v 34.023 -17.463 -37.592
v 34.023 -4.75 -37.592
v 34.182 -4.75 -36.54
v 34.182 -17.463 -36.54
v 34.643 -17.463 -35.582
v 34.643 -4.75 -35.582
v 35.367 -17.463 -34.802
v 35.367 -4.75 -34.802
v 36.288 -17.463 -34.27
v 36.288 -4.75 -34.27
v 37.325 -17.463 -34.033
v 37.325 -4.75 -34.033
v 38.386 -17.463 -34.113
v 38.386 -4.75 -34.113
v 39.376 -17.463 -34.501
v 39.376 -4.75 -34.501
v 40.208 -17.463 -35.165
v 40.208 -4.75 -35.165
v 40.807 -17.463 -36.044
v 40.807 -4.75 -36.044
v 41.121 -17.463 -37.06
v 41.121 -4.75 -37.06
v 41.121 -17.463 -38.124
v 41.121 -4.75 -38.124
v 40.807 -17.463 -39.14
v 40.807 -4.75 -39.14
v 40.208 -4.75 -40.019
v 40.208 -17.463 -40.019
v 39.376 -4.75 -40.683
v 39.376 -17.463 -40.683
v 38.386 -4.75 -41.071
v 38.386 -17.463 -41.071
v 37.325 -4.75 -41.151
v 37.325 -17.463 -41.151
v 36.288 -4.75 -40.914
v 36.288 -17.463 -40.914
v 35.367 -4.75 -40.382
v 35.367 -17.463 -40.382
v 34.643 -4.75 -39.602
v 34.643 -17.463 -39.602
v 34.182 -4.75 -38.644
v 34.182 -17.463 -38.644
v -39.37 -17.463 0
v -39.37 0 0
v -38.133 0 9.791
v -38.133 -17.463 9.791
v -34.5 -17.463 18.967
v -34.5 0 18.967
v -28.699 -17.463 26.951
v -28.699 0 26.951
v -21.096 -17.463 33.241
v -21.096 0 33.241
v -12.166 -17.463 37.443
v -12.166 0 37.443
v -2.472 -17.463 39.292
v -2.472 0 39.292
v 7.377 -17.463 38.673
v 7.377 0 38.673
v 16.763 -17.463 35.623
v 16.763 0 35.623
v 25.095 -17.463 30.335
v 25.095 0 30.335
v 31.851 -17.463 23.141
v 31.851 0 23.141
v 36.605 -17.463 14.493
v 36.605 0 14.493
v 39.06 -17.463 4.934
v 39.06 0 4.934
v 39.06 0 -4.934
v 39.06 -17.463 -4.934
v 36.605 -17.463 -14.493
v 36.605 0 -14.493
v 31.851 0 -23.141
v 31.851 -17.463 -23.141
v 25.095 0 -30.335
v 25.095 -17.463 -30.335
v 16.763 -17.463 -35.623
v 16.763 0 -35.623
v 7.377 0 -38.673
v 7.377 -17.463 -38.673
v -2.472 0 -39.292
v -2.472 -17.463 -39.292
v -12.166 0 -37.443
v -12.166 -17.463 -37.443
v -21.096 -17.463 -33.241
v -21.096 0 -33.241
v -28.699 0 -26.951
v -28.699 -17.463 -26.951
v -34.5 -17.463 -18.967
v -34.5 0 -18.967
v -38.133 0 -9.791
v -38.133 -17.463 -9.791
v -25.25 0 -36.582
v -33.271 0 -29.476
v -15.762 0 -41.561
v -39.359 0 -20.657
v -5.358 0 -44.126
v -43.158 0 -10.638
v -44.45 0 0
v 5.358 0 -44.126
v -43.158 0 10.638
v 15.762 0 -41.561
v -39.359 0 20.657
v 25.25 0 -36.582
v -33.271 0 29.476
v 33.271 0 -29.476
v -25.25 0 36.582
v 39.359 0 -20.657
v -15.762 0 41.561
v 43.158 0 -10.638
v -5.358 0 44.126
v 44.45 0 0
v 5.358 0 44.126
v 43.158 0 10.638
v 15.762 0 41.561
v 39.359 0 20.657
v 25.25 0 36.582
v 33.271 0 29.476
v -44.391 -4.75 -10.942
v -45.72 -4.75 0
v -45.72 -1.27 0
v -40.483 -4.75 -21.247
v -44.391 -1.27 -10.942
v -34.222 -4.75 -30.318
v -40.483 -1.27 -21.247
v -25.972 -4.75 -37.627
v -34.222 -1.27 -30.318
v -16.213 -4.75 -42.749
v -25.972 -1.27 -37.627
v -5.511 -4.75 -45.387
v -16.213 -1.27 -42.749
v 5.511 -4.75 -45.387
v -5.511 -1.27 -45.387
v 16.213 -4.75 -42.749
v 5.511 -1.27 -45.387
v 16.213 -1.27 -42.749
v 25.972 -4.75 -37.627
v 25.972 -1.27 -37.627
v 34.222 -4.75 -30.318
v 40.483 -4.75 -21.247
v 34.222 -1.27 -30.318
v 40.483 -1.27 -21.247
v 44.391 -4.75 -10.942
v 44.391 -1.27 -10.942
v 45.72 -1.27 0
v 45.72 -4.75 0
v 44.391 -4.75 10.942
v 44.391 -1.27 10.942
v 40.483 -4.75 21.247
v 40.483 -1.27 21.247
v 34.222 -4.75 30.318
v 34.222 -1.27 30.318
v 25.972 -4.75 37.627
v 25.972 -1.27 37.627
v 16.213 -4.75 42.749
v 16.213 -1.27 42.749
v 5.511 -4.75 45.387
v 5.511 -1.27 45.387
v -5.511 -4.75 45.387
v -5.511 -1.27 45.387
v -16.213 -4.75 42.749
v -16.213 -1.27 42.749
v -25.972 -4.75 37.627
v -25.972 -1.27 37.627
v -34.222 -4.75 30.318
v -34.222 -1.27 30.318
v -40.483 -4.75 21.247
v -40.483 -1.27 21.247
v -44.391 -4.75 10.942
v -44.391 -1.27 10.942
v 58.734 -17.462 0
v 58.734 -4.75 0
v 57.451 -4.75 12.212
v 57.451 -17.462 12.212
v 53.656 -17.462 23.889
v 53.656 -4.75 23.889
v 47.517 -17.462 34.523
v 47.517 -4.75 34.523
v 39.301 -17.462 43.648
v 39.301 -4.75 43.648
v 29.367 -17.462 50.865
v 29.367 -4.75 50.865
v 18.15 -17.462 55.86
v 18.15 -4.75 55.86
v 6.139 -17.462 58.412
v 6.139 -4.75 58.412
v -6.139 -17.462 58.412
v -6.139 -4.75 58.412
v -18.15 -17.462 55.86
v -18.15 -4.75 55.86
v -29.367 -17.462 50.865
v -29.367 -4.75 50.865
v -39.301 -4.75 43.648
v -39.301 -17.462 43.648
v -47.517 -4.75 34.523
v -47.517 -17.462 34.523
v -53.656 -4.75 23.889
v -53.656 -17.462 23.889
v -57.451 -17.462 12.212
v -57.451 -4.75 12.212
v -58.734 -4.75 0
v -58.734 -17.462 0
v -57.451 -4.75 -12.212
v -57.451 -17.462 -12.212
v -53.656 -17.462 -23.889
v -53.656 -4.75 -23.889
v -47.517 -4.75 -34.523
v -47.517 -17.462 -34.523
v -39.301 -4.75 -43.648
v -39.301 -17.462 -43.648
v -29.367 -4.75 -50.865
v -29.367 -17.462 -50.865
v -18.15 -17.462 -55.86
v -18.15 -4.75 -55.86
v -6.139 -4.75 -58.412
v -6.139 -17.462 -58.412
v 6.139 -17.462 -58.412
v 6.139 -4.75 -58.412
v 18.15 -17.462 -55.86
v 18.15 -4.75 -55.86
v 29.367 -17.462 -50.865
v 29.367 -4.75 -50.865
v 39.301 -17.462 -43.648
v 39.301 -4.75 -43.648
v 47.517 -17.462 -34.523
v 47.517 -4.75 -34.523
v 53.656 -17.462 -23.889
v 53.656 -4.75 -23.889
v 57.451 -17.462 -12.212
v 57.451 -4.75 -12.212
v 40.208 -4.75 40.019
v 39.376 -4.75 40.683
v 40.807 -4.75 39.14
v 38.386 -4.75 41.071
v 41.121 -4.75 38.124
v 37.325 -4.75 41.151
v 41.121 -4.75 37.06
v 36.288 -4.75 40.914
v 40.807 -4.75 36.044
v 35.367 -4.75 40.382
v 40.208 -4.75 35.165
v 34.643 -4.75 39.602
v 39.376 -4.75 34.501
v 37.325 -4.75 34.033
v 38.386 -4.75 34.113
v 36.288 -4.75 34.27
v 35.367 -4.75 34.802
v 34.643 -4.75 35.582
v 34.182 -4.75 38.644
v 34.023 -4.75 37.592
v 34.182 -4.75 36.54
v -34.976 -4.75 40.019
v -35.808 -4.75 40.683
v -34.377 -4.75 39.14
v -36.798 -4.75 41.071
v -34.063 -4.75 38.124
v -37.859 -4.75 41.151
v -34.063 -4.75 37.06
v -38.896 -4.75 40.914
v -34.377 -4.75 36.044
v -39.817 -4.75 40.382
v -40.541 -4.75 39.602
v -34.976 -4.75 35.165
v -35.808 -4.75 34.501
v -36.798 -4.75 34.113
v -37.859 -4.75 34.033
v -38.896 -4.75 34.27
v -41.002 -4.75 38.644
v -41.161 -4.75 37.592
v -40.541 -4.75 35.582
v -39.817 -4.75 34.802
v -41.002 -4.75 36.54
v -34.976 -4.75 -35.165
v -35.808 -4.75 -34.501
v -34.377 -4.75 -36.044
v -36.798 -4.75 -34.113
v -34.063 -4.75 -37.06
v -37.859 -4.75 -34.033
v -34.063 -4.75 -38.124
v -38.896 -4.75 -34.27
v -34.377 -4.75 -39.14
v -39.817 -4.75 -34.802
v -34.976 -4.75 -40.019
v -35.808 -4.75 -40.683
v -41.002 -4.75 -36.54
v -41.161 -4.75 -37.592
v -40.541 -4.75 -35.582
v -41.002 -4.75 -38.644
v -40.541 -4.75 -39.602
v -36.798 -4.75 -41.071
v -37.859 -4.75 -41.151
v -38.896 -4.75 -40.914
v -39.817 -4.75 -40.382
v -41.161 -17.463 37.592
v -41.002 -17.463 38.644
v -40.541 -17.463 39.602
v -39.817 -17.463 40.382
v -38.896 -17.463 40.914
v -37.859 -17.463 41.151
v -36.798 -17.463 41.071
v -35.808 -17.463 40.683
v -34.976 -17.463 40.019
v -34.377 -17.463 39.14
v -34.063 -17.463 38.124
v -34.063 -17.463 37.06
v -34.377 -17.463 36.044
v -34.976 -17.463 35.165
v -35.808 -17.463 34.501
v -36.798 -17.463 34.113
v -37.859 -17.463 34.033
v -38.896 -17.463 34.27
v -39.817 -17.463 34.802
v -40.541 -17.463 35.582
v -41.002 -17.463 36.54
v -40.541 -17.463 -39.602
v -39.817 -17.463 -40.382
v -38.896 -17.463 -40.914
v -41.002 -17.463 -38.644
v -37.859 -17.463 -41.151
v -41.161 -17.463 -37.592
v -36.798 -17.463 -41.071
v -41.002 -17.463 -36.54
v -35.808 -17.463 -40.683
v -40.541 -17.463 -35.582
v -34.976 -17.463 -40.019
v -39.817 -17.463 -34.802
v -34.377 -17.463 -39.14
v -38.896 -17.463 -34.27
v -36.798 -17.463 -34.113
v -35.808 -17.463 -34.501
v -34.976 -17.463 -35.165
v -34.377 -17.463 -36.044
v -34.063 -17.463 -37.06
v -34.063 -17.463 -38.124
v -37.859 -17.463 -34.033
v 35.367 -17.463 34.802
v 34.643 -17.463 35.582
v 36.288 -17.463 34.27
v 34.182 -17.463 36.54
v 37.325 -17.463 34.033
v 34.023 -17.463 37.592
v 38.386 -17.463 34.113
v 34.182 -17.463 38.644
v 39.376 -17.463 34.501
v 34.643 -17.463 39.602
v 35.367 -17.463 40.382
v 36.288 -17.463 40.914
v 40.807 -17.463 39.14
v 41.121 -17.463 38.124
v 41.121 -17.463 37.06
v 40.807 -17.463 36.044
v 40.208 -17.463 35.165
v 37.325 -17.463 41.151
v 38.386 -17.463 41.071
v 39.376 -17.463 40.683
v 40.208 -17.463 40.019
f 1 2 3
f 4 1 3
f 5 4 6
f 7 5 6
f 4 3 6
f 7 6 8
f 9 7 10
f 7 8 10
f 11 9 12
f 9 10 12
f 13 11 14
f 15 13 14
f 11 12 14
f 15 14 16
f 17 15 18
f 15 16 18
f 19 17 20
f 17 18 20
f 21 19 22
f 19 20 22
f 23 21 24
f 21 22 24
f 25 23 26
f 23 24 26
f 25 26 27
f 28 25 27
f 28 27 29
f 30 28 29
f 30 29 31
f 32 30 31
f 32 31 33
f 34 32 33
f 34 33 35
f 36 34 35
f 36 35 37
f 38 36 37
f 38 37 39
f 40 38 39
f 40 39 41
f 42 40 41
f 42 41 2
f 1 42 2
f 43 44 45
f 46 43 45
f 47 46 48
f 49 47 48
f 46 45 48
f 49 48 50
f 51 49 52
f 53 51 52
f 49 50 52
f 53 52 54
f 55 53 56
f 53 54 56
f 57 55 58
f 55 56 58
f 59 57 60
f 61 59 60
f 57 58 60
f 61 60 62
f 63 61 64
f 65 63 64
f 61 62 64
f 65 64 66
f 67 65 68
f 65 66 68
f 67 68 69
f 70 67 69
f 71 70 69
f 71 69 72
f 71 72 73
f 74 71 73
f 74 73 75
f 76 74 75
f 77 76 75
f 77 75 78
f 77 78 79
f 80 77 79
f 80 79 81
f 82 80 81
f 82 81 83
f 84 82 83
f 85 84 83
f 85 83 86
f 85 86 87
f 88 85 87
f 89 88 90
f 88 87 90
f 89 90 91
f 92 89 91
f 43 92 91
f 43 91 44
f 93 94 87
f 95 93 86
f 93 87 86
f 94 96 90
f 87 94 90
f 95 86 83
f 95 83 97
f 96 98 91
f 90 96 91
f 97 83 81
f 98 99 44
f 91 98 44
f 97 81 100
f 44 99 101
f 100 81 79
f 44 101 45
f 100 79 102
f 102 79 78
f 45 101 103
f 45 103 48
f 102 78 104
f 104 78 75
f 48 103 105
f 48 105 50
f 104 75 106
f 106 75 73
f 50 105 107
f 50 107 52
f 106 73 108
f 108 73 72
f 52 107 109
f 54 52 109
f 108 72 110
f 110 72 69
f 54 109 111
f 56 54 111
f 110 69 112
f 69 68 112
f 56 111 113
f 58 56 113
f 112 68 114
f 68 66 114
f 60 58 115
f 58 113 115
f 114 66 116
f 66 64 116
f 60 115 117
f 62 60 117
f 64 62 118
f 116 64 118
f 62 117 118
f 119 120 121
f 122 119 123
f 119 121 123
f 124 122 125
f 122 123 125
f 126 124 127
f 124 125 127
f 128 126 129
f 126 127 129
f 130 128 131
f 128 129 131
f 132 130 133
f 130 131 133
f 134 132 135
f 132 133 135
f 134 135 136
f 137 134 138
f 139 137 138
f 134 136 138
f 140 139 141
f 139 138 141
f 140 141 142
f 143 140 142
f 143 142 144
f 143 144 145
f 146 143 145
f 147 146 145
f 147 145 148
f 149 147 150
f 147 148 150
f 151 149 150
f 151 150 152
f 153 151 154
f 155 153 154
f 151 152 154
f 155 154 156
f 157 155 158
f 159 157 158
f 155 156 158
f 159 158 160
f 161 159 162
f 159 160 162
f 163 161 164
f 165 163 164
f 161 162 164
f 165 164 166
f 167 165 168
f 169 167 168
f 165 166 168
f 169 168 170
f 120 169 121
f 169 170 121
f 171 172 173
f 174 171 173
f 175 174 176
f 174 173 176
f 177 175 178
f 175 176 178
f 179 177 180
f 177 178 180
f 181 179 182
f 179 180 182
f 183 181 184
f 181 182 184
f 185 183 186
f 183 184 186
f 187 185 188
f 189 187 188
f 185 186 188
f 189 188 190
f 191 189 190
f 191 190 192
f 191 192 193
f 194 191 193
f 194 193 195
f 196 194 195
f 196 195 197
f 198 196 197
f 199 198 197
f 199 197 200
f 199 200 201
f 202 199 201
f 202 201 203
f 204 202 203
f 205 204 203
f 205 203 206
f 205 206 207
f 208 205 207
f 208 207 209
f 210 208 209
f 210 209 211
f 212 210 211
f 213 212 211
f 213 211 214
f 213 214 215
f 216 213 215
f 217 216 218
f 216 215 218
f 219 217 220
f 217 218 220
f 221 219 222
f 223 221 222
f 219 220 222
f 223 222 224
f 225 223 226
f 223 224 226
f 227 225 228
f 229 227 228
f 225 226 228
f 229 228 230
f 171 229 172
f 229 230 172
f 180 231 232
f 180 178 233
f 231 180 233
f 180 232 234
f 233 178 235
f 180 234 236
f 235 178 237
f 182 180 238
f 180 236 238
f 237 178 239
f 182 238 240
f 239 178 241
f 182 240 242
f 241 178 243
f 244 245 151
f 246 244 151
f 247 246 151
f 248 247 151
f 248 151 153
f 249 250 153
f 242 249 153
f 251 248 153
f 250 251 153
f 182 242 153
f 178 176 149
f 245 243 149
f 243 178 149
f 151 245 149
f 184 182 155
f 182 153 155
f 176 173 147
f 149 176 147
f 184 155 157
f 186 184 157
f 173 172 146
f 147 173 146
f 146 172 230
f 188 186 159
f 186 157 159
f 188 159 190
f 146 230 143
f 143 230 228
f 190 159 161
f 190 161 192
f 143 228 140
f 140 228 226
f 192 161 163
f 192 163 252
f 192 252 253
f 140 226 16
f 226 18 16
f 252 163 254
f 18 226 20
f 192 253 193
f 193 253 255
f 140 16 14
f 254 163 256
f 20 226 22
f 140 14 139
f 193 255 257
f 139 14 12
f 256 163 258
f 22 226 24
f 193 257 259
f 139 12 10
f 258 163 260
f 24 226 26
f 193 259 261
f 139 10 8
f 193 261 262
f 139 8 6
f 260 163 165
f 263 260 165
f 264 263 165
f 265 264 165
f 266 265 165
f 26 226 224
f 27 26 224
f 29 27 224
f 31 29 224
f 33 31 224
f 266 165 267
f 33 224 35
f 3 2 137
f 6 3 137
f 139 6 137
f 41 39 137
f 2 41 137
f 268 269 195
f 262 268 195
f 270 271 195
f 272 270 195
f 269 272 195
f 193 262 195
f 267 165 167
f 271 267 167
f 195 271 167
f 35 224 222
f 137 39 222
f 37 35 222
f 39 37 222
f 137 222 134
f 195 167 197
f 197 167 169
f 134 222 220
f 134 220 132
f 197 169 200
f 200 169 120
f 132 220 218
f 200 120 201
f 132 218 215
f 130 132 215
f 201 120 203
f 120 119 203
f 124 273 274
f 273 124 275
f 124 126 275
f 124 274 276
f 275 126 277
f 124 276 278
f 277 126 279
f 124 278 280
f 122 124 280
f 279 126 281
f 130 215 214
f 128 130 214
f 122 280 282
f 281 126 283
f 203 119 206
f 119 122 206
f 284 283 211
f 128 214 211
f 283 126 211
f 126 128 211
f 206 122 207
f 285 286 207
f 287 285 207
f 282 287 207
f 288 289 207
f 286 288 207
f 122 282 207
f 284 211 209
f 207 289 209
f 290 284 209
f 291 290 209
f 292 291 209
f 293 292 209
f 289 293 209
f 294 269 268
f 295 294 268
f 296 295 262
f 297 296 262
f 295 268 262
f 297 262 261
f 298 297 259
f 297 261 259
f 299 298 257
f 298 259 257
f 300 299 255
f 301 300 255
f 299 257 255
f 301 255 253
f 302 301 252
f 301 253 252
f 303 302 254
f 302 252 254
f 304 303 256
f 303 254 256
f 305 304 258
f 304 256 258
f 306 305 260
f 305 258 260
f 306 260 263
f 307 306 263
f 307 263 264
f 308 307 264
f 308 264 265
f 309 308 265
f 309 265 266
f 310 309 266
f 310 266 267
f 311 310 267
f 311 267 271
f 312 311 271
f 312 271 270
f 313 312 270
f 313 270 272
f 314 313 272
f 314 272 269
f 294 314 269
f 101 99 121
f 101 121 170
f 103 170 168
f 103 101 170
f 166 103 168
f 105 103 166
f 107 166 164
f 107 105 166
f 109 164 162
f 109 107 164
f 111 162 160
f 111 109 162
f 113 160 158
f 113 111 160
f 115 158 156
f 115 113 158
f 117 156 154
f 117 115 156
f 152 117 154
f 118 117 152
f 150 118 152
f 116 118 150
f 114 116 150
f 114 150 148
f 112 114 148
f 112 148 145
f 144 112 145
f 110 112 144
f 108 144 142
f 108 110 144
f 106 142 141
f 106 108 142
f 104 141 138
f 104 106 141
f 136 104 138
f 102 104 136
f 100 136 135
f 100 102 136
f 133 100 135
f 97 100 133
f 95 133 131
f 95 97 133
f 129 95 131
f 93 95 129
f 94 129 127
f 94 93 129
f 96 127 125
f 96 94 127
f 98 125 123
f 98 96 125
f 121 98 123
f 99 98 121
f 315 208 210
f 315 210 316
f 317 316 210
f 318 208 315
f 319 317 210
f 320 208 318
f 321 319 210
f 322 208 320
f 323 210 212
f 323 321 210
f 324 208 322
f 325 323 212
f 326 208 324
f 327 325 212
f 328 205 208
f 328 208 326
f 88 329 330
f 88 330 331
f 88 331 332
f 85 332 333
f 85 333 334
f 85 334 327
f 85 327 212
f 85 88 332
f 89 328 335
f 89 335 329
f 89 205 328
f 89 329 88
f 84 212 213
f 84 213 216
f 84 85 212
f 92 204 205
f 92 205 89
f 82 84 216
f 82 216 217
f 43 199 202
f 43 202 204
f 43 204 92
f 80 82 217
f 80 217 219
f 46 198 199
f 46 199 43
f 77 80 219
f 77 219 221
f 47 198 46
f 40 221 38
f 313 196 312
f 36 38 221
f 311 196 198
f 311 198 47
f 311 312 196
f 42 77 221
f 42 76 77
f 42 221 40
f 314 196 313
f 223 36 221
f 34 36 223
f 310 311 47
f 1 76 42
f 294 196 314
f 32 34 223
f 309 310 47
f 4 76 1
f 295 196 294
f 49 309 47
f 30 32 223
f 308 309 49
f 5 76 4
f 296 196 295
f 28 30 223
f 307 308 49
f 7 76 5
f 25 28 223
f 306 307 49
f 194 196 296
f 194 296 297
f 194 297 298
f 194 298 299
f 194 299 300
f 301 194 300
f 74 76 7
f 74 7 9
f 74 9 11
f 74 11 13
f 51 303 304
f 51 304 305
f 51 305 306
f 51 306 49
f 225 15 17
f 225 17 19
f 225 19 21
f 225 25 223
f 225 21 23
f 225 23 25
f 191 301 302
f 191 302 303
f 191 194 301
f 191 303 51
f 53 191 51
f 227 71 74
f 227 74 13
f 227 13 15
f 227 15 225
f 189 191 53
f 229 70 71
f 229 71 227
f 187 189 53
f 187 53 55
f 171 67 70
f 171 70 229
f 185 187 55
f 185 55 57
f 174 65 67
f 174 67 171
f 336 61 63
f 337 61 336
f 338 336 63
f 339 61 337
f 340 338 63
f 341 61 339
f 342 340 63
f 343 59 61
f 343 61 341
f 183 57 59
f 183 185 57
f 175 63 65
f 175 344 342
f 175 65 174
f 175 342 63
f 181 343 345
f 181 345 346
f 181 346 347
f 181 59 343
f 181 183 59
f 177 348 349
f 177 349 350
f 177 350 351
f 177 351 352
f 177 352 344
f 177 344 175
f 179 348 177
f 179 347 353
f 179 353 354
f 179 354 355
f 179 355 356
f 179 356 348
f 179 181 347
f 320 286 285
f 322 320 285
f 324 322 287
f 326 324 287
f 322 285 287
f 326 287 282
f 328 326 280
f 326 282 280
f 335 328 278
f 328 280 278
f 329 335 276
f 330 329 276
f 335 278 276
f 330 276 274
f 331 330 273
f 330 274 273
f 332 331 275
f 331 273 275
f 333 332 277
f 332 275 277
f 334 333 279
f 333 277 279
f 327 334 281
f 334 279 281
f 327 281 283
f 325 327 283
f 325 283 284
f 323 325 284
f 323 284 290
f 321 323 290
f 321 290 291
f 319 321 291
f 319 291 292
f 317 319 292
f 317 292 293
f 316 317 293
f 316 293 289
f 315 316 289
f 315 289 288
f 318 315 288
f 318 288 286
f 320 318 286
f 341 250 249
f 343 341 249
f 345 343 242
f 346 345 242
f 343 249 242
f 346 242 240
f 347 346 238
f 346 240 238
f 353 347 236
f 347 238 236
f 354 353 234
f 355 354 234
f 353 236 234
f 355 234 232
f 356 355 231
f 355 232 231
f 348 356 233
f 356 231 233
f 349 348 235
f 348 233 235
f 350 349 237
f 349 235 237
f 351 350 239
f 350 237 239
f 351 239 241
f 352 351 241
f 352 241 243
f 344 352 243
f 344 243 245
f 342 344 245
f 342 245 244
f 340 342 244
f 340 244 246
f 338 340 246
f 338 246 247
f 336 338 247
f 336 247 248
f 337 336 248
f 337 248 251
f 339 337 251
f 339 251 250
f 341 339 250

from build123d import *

# Parameters (mm, degrees)
F0_R     = 58.7341750738
F1_DEPTH = 17.4625
F2_W     = 17.6311007185
F2_H     = 8.097752736
F4_SIZE  = 1.27
F6_D     = 7.1374
F7_D     = 78.74


with BuildPart() as f1:
    # F0 (on Front) → F1 (new body)
    with BuildSketch(Plane.XZ):
        Circle(F0_R)
    extrude(amount=F1_DEPTH)

    # F2 (on Top) → F3 (revolve, cut)
    with BuildSketch(Plane.XY):
        with Locations((-54.5355503593, -0.700923632)):
            Rectangle(F2_W, F2_H)
    revolve(axis=Axis((0, -1.8075983971, 0), (0, -1, 0)), mode=Mode.SUBTRACT)

    # F4
    f4_edges = [f1.edges().sort_by_distance(p)[0] for p in [
        (45.72, 0, 0),
    ]]
    chamfer(f4_edges, length=F4_SIZE)

    # F6 (through all)
    with Locations(Plane.XZ.offset(17.4625)):
        with Locations((-37.592, 37.592), (37.592, 37.592), (37.592, -37.592), (-37.592, -37.592)):
            Hole(F6_D / 2)

    # F7 (through all)
    with Locations(Plane.XZ.offset(17.4625)):
        with Locations((0, 0)):
            Hole(F7_D / 2)


solid = f1.part
